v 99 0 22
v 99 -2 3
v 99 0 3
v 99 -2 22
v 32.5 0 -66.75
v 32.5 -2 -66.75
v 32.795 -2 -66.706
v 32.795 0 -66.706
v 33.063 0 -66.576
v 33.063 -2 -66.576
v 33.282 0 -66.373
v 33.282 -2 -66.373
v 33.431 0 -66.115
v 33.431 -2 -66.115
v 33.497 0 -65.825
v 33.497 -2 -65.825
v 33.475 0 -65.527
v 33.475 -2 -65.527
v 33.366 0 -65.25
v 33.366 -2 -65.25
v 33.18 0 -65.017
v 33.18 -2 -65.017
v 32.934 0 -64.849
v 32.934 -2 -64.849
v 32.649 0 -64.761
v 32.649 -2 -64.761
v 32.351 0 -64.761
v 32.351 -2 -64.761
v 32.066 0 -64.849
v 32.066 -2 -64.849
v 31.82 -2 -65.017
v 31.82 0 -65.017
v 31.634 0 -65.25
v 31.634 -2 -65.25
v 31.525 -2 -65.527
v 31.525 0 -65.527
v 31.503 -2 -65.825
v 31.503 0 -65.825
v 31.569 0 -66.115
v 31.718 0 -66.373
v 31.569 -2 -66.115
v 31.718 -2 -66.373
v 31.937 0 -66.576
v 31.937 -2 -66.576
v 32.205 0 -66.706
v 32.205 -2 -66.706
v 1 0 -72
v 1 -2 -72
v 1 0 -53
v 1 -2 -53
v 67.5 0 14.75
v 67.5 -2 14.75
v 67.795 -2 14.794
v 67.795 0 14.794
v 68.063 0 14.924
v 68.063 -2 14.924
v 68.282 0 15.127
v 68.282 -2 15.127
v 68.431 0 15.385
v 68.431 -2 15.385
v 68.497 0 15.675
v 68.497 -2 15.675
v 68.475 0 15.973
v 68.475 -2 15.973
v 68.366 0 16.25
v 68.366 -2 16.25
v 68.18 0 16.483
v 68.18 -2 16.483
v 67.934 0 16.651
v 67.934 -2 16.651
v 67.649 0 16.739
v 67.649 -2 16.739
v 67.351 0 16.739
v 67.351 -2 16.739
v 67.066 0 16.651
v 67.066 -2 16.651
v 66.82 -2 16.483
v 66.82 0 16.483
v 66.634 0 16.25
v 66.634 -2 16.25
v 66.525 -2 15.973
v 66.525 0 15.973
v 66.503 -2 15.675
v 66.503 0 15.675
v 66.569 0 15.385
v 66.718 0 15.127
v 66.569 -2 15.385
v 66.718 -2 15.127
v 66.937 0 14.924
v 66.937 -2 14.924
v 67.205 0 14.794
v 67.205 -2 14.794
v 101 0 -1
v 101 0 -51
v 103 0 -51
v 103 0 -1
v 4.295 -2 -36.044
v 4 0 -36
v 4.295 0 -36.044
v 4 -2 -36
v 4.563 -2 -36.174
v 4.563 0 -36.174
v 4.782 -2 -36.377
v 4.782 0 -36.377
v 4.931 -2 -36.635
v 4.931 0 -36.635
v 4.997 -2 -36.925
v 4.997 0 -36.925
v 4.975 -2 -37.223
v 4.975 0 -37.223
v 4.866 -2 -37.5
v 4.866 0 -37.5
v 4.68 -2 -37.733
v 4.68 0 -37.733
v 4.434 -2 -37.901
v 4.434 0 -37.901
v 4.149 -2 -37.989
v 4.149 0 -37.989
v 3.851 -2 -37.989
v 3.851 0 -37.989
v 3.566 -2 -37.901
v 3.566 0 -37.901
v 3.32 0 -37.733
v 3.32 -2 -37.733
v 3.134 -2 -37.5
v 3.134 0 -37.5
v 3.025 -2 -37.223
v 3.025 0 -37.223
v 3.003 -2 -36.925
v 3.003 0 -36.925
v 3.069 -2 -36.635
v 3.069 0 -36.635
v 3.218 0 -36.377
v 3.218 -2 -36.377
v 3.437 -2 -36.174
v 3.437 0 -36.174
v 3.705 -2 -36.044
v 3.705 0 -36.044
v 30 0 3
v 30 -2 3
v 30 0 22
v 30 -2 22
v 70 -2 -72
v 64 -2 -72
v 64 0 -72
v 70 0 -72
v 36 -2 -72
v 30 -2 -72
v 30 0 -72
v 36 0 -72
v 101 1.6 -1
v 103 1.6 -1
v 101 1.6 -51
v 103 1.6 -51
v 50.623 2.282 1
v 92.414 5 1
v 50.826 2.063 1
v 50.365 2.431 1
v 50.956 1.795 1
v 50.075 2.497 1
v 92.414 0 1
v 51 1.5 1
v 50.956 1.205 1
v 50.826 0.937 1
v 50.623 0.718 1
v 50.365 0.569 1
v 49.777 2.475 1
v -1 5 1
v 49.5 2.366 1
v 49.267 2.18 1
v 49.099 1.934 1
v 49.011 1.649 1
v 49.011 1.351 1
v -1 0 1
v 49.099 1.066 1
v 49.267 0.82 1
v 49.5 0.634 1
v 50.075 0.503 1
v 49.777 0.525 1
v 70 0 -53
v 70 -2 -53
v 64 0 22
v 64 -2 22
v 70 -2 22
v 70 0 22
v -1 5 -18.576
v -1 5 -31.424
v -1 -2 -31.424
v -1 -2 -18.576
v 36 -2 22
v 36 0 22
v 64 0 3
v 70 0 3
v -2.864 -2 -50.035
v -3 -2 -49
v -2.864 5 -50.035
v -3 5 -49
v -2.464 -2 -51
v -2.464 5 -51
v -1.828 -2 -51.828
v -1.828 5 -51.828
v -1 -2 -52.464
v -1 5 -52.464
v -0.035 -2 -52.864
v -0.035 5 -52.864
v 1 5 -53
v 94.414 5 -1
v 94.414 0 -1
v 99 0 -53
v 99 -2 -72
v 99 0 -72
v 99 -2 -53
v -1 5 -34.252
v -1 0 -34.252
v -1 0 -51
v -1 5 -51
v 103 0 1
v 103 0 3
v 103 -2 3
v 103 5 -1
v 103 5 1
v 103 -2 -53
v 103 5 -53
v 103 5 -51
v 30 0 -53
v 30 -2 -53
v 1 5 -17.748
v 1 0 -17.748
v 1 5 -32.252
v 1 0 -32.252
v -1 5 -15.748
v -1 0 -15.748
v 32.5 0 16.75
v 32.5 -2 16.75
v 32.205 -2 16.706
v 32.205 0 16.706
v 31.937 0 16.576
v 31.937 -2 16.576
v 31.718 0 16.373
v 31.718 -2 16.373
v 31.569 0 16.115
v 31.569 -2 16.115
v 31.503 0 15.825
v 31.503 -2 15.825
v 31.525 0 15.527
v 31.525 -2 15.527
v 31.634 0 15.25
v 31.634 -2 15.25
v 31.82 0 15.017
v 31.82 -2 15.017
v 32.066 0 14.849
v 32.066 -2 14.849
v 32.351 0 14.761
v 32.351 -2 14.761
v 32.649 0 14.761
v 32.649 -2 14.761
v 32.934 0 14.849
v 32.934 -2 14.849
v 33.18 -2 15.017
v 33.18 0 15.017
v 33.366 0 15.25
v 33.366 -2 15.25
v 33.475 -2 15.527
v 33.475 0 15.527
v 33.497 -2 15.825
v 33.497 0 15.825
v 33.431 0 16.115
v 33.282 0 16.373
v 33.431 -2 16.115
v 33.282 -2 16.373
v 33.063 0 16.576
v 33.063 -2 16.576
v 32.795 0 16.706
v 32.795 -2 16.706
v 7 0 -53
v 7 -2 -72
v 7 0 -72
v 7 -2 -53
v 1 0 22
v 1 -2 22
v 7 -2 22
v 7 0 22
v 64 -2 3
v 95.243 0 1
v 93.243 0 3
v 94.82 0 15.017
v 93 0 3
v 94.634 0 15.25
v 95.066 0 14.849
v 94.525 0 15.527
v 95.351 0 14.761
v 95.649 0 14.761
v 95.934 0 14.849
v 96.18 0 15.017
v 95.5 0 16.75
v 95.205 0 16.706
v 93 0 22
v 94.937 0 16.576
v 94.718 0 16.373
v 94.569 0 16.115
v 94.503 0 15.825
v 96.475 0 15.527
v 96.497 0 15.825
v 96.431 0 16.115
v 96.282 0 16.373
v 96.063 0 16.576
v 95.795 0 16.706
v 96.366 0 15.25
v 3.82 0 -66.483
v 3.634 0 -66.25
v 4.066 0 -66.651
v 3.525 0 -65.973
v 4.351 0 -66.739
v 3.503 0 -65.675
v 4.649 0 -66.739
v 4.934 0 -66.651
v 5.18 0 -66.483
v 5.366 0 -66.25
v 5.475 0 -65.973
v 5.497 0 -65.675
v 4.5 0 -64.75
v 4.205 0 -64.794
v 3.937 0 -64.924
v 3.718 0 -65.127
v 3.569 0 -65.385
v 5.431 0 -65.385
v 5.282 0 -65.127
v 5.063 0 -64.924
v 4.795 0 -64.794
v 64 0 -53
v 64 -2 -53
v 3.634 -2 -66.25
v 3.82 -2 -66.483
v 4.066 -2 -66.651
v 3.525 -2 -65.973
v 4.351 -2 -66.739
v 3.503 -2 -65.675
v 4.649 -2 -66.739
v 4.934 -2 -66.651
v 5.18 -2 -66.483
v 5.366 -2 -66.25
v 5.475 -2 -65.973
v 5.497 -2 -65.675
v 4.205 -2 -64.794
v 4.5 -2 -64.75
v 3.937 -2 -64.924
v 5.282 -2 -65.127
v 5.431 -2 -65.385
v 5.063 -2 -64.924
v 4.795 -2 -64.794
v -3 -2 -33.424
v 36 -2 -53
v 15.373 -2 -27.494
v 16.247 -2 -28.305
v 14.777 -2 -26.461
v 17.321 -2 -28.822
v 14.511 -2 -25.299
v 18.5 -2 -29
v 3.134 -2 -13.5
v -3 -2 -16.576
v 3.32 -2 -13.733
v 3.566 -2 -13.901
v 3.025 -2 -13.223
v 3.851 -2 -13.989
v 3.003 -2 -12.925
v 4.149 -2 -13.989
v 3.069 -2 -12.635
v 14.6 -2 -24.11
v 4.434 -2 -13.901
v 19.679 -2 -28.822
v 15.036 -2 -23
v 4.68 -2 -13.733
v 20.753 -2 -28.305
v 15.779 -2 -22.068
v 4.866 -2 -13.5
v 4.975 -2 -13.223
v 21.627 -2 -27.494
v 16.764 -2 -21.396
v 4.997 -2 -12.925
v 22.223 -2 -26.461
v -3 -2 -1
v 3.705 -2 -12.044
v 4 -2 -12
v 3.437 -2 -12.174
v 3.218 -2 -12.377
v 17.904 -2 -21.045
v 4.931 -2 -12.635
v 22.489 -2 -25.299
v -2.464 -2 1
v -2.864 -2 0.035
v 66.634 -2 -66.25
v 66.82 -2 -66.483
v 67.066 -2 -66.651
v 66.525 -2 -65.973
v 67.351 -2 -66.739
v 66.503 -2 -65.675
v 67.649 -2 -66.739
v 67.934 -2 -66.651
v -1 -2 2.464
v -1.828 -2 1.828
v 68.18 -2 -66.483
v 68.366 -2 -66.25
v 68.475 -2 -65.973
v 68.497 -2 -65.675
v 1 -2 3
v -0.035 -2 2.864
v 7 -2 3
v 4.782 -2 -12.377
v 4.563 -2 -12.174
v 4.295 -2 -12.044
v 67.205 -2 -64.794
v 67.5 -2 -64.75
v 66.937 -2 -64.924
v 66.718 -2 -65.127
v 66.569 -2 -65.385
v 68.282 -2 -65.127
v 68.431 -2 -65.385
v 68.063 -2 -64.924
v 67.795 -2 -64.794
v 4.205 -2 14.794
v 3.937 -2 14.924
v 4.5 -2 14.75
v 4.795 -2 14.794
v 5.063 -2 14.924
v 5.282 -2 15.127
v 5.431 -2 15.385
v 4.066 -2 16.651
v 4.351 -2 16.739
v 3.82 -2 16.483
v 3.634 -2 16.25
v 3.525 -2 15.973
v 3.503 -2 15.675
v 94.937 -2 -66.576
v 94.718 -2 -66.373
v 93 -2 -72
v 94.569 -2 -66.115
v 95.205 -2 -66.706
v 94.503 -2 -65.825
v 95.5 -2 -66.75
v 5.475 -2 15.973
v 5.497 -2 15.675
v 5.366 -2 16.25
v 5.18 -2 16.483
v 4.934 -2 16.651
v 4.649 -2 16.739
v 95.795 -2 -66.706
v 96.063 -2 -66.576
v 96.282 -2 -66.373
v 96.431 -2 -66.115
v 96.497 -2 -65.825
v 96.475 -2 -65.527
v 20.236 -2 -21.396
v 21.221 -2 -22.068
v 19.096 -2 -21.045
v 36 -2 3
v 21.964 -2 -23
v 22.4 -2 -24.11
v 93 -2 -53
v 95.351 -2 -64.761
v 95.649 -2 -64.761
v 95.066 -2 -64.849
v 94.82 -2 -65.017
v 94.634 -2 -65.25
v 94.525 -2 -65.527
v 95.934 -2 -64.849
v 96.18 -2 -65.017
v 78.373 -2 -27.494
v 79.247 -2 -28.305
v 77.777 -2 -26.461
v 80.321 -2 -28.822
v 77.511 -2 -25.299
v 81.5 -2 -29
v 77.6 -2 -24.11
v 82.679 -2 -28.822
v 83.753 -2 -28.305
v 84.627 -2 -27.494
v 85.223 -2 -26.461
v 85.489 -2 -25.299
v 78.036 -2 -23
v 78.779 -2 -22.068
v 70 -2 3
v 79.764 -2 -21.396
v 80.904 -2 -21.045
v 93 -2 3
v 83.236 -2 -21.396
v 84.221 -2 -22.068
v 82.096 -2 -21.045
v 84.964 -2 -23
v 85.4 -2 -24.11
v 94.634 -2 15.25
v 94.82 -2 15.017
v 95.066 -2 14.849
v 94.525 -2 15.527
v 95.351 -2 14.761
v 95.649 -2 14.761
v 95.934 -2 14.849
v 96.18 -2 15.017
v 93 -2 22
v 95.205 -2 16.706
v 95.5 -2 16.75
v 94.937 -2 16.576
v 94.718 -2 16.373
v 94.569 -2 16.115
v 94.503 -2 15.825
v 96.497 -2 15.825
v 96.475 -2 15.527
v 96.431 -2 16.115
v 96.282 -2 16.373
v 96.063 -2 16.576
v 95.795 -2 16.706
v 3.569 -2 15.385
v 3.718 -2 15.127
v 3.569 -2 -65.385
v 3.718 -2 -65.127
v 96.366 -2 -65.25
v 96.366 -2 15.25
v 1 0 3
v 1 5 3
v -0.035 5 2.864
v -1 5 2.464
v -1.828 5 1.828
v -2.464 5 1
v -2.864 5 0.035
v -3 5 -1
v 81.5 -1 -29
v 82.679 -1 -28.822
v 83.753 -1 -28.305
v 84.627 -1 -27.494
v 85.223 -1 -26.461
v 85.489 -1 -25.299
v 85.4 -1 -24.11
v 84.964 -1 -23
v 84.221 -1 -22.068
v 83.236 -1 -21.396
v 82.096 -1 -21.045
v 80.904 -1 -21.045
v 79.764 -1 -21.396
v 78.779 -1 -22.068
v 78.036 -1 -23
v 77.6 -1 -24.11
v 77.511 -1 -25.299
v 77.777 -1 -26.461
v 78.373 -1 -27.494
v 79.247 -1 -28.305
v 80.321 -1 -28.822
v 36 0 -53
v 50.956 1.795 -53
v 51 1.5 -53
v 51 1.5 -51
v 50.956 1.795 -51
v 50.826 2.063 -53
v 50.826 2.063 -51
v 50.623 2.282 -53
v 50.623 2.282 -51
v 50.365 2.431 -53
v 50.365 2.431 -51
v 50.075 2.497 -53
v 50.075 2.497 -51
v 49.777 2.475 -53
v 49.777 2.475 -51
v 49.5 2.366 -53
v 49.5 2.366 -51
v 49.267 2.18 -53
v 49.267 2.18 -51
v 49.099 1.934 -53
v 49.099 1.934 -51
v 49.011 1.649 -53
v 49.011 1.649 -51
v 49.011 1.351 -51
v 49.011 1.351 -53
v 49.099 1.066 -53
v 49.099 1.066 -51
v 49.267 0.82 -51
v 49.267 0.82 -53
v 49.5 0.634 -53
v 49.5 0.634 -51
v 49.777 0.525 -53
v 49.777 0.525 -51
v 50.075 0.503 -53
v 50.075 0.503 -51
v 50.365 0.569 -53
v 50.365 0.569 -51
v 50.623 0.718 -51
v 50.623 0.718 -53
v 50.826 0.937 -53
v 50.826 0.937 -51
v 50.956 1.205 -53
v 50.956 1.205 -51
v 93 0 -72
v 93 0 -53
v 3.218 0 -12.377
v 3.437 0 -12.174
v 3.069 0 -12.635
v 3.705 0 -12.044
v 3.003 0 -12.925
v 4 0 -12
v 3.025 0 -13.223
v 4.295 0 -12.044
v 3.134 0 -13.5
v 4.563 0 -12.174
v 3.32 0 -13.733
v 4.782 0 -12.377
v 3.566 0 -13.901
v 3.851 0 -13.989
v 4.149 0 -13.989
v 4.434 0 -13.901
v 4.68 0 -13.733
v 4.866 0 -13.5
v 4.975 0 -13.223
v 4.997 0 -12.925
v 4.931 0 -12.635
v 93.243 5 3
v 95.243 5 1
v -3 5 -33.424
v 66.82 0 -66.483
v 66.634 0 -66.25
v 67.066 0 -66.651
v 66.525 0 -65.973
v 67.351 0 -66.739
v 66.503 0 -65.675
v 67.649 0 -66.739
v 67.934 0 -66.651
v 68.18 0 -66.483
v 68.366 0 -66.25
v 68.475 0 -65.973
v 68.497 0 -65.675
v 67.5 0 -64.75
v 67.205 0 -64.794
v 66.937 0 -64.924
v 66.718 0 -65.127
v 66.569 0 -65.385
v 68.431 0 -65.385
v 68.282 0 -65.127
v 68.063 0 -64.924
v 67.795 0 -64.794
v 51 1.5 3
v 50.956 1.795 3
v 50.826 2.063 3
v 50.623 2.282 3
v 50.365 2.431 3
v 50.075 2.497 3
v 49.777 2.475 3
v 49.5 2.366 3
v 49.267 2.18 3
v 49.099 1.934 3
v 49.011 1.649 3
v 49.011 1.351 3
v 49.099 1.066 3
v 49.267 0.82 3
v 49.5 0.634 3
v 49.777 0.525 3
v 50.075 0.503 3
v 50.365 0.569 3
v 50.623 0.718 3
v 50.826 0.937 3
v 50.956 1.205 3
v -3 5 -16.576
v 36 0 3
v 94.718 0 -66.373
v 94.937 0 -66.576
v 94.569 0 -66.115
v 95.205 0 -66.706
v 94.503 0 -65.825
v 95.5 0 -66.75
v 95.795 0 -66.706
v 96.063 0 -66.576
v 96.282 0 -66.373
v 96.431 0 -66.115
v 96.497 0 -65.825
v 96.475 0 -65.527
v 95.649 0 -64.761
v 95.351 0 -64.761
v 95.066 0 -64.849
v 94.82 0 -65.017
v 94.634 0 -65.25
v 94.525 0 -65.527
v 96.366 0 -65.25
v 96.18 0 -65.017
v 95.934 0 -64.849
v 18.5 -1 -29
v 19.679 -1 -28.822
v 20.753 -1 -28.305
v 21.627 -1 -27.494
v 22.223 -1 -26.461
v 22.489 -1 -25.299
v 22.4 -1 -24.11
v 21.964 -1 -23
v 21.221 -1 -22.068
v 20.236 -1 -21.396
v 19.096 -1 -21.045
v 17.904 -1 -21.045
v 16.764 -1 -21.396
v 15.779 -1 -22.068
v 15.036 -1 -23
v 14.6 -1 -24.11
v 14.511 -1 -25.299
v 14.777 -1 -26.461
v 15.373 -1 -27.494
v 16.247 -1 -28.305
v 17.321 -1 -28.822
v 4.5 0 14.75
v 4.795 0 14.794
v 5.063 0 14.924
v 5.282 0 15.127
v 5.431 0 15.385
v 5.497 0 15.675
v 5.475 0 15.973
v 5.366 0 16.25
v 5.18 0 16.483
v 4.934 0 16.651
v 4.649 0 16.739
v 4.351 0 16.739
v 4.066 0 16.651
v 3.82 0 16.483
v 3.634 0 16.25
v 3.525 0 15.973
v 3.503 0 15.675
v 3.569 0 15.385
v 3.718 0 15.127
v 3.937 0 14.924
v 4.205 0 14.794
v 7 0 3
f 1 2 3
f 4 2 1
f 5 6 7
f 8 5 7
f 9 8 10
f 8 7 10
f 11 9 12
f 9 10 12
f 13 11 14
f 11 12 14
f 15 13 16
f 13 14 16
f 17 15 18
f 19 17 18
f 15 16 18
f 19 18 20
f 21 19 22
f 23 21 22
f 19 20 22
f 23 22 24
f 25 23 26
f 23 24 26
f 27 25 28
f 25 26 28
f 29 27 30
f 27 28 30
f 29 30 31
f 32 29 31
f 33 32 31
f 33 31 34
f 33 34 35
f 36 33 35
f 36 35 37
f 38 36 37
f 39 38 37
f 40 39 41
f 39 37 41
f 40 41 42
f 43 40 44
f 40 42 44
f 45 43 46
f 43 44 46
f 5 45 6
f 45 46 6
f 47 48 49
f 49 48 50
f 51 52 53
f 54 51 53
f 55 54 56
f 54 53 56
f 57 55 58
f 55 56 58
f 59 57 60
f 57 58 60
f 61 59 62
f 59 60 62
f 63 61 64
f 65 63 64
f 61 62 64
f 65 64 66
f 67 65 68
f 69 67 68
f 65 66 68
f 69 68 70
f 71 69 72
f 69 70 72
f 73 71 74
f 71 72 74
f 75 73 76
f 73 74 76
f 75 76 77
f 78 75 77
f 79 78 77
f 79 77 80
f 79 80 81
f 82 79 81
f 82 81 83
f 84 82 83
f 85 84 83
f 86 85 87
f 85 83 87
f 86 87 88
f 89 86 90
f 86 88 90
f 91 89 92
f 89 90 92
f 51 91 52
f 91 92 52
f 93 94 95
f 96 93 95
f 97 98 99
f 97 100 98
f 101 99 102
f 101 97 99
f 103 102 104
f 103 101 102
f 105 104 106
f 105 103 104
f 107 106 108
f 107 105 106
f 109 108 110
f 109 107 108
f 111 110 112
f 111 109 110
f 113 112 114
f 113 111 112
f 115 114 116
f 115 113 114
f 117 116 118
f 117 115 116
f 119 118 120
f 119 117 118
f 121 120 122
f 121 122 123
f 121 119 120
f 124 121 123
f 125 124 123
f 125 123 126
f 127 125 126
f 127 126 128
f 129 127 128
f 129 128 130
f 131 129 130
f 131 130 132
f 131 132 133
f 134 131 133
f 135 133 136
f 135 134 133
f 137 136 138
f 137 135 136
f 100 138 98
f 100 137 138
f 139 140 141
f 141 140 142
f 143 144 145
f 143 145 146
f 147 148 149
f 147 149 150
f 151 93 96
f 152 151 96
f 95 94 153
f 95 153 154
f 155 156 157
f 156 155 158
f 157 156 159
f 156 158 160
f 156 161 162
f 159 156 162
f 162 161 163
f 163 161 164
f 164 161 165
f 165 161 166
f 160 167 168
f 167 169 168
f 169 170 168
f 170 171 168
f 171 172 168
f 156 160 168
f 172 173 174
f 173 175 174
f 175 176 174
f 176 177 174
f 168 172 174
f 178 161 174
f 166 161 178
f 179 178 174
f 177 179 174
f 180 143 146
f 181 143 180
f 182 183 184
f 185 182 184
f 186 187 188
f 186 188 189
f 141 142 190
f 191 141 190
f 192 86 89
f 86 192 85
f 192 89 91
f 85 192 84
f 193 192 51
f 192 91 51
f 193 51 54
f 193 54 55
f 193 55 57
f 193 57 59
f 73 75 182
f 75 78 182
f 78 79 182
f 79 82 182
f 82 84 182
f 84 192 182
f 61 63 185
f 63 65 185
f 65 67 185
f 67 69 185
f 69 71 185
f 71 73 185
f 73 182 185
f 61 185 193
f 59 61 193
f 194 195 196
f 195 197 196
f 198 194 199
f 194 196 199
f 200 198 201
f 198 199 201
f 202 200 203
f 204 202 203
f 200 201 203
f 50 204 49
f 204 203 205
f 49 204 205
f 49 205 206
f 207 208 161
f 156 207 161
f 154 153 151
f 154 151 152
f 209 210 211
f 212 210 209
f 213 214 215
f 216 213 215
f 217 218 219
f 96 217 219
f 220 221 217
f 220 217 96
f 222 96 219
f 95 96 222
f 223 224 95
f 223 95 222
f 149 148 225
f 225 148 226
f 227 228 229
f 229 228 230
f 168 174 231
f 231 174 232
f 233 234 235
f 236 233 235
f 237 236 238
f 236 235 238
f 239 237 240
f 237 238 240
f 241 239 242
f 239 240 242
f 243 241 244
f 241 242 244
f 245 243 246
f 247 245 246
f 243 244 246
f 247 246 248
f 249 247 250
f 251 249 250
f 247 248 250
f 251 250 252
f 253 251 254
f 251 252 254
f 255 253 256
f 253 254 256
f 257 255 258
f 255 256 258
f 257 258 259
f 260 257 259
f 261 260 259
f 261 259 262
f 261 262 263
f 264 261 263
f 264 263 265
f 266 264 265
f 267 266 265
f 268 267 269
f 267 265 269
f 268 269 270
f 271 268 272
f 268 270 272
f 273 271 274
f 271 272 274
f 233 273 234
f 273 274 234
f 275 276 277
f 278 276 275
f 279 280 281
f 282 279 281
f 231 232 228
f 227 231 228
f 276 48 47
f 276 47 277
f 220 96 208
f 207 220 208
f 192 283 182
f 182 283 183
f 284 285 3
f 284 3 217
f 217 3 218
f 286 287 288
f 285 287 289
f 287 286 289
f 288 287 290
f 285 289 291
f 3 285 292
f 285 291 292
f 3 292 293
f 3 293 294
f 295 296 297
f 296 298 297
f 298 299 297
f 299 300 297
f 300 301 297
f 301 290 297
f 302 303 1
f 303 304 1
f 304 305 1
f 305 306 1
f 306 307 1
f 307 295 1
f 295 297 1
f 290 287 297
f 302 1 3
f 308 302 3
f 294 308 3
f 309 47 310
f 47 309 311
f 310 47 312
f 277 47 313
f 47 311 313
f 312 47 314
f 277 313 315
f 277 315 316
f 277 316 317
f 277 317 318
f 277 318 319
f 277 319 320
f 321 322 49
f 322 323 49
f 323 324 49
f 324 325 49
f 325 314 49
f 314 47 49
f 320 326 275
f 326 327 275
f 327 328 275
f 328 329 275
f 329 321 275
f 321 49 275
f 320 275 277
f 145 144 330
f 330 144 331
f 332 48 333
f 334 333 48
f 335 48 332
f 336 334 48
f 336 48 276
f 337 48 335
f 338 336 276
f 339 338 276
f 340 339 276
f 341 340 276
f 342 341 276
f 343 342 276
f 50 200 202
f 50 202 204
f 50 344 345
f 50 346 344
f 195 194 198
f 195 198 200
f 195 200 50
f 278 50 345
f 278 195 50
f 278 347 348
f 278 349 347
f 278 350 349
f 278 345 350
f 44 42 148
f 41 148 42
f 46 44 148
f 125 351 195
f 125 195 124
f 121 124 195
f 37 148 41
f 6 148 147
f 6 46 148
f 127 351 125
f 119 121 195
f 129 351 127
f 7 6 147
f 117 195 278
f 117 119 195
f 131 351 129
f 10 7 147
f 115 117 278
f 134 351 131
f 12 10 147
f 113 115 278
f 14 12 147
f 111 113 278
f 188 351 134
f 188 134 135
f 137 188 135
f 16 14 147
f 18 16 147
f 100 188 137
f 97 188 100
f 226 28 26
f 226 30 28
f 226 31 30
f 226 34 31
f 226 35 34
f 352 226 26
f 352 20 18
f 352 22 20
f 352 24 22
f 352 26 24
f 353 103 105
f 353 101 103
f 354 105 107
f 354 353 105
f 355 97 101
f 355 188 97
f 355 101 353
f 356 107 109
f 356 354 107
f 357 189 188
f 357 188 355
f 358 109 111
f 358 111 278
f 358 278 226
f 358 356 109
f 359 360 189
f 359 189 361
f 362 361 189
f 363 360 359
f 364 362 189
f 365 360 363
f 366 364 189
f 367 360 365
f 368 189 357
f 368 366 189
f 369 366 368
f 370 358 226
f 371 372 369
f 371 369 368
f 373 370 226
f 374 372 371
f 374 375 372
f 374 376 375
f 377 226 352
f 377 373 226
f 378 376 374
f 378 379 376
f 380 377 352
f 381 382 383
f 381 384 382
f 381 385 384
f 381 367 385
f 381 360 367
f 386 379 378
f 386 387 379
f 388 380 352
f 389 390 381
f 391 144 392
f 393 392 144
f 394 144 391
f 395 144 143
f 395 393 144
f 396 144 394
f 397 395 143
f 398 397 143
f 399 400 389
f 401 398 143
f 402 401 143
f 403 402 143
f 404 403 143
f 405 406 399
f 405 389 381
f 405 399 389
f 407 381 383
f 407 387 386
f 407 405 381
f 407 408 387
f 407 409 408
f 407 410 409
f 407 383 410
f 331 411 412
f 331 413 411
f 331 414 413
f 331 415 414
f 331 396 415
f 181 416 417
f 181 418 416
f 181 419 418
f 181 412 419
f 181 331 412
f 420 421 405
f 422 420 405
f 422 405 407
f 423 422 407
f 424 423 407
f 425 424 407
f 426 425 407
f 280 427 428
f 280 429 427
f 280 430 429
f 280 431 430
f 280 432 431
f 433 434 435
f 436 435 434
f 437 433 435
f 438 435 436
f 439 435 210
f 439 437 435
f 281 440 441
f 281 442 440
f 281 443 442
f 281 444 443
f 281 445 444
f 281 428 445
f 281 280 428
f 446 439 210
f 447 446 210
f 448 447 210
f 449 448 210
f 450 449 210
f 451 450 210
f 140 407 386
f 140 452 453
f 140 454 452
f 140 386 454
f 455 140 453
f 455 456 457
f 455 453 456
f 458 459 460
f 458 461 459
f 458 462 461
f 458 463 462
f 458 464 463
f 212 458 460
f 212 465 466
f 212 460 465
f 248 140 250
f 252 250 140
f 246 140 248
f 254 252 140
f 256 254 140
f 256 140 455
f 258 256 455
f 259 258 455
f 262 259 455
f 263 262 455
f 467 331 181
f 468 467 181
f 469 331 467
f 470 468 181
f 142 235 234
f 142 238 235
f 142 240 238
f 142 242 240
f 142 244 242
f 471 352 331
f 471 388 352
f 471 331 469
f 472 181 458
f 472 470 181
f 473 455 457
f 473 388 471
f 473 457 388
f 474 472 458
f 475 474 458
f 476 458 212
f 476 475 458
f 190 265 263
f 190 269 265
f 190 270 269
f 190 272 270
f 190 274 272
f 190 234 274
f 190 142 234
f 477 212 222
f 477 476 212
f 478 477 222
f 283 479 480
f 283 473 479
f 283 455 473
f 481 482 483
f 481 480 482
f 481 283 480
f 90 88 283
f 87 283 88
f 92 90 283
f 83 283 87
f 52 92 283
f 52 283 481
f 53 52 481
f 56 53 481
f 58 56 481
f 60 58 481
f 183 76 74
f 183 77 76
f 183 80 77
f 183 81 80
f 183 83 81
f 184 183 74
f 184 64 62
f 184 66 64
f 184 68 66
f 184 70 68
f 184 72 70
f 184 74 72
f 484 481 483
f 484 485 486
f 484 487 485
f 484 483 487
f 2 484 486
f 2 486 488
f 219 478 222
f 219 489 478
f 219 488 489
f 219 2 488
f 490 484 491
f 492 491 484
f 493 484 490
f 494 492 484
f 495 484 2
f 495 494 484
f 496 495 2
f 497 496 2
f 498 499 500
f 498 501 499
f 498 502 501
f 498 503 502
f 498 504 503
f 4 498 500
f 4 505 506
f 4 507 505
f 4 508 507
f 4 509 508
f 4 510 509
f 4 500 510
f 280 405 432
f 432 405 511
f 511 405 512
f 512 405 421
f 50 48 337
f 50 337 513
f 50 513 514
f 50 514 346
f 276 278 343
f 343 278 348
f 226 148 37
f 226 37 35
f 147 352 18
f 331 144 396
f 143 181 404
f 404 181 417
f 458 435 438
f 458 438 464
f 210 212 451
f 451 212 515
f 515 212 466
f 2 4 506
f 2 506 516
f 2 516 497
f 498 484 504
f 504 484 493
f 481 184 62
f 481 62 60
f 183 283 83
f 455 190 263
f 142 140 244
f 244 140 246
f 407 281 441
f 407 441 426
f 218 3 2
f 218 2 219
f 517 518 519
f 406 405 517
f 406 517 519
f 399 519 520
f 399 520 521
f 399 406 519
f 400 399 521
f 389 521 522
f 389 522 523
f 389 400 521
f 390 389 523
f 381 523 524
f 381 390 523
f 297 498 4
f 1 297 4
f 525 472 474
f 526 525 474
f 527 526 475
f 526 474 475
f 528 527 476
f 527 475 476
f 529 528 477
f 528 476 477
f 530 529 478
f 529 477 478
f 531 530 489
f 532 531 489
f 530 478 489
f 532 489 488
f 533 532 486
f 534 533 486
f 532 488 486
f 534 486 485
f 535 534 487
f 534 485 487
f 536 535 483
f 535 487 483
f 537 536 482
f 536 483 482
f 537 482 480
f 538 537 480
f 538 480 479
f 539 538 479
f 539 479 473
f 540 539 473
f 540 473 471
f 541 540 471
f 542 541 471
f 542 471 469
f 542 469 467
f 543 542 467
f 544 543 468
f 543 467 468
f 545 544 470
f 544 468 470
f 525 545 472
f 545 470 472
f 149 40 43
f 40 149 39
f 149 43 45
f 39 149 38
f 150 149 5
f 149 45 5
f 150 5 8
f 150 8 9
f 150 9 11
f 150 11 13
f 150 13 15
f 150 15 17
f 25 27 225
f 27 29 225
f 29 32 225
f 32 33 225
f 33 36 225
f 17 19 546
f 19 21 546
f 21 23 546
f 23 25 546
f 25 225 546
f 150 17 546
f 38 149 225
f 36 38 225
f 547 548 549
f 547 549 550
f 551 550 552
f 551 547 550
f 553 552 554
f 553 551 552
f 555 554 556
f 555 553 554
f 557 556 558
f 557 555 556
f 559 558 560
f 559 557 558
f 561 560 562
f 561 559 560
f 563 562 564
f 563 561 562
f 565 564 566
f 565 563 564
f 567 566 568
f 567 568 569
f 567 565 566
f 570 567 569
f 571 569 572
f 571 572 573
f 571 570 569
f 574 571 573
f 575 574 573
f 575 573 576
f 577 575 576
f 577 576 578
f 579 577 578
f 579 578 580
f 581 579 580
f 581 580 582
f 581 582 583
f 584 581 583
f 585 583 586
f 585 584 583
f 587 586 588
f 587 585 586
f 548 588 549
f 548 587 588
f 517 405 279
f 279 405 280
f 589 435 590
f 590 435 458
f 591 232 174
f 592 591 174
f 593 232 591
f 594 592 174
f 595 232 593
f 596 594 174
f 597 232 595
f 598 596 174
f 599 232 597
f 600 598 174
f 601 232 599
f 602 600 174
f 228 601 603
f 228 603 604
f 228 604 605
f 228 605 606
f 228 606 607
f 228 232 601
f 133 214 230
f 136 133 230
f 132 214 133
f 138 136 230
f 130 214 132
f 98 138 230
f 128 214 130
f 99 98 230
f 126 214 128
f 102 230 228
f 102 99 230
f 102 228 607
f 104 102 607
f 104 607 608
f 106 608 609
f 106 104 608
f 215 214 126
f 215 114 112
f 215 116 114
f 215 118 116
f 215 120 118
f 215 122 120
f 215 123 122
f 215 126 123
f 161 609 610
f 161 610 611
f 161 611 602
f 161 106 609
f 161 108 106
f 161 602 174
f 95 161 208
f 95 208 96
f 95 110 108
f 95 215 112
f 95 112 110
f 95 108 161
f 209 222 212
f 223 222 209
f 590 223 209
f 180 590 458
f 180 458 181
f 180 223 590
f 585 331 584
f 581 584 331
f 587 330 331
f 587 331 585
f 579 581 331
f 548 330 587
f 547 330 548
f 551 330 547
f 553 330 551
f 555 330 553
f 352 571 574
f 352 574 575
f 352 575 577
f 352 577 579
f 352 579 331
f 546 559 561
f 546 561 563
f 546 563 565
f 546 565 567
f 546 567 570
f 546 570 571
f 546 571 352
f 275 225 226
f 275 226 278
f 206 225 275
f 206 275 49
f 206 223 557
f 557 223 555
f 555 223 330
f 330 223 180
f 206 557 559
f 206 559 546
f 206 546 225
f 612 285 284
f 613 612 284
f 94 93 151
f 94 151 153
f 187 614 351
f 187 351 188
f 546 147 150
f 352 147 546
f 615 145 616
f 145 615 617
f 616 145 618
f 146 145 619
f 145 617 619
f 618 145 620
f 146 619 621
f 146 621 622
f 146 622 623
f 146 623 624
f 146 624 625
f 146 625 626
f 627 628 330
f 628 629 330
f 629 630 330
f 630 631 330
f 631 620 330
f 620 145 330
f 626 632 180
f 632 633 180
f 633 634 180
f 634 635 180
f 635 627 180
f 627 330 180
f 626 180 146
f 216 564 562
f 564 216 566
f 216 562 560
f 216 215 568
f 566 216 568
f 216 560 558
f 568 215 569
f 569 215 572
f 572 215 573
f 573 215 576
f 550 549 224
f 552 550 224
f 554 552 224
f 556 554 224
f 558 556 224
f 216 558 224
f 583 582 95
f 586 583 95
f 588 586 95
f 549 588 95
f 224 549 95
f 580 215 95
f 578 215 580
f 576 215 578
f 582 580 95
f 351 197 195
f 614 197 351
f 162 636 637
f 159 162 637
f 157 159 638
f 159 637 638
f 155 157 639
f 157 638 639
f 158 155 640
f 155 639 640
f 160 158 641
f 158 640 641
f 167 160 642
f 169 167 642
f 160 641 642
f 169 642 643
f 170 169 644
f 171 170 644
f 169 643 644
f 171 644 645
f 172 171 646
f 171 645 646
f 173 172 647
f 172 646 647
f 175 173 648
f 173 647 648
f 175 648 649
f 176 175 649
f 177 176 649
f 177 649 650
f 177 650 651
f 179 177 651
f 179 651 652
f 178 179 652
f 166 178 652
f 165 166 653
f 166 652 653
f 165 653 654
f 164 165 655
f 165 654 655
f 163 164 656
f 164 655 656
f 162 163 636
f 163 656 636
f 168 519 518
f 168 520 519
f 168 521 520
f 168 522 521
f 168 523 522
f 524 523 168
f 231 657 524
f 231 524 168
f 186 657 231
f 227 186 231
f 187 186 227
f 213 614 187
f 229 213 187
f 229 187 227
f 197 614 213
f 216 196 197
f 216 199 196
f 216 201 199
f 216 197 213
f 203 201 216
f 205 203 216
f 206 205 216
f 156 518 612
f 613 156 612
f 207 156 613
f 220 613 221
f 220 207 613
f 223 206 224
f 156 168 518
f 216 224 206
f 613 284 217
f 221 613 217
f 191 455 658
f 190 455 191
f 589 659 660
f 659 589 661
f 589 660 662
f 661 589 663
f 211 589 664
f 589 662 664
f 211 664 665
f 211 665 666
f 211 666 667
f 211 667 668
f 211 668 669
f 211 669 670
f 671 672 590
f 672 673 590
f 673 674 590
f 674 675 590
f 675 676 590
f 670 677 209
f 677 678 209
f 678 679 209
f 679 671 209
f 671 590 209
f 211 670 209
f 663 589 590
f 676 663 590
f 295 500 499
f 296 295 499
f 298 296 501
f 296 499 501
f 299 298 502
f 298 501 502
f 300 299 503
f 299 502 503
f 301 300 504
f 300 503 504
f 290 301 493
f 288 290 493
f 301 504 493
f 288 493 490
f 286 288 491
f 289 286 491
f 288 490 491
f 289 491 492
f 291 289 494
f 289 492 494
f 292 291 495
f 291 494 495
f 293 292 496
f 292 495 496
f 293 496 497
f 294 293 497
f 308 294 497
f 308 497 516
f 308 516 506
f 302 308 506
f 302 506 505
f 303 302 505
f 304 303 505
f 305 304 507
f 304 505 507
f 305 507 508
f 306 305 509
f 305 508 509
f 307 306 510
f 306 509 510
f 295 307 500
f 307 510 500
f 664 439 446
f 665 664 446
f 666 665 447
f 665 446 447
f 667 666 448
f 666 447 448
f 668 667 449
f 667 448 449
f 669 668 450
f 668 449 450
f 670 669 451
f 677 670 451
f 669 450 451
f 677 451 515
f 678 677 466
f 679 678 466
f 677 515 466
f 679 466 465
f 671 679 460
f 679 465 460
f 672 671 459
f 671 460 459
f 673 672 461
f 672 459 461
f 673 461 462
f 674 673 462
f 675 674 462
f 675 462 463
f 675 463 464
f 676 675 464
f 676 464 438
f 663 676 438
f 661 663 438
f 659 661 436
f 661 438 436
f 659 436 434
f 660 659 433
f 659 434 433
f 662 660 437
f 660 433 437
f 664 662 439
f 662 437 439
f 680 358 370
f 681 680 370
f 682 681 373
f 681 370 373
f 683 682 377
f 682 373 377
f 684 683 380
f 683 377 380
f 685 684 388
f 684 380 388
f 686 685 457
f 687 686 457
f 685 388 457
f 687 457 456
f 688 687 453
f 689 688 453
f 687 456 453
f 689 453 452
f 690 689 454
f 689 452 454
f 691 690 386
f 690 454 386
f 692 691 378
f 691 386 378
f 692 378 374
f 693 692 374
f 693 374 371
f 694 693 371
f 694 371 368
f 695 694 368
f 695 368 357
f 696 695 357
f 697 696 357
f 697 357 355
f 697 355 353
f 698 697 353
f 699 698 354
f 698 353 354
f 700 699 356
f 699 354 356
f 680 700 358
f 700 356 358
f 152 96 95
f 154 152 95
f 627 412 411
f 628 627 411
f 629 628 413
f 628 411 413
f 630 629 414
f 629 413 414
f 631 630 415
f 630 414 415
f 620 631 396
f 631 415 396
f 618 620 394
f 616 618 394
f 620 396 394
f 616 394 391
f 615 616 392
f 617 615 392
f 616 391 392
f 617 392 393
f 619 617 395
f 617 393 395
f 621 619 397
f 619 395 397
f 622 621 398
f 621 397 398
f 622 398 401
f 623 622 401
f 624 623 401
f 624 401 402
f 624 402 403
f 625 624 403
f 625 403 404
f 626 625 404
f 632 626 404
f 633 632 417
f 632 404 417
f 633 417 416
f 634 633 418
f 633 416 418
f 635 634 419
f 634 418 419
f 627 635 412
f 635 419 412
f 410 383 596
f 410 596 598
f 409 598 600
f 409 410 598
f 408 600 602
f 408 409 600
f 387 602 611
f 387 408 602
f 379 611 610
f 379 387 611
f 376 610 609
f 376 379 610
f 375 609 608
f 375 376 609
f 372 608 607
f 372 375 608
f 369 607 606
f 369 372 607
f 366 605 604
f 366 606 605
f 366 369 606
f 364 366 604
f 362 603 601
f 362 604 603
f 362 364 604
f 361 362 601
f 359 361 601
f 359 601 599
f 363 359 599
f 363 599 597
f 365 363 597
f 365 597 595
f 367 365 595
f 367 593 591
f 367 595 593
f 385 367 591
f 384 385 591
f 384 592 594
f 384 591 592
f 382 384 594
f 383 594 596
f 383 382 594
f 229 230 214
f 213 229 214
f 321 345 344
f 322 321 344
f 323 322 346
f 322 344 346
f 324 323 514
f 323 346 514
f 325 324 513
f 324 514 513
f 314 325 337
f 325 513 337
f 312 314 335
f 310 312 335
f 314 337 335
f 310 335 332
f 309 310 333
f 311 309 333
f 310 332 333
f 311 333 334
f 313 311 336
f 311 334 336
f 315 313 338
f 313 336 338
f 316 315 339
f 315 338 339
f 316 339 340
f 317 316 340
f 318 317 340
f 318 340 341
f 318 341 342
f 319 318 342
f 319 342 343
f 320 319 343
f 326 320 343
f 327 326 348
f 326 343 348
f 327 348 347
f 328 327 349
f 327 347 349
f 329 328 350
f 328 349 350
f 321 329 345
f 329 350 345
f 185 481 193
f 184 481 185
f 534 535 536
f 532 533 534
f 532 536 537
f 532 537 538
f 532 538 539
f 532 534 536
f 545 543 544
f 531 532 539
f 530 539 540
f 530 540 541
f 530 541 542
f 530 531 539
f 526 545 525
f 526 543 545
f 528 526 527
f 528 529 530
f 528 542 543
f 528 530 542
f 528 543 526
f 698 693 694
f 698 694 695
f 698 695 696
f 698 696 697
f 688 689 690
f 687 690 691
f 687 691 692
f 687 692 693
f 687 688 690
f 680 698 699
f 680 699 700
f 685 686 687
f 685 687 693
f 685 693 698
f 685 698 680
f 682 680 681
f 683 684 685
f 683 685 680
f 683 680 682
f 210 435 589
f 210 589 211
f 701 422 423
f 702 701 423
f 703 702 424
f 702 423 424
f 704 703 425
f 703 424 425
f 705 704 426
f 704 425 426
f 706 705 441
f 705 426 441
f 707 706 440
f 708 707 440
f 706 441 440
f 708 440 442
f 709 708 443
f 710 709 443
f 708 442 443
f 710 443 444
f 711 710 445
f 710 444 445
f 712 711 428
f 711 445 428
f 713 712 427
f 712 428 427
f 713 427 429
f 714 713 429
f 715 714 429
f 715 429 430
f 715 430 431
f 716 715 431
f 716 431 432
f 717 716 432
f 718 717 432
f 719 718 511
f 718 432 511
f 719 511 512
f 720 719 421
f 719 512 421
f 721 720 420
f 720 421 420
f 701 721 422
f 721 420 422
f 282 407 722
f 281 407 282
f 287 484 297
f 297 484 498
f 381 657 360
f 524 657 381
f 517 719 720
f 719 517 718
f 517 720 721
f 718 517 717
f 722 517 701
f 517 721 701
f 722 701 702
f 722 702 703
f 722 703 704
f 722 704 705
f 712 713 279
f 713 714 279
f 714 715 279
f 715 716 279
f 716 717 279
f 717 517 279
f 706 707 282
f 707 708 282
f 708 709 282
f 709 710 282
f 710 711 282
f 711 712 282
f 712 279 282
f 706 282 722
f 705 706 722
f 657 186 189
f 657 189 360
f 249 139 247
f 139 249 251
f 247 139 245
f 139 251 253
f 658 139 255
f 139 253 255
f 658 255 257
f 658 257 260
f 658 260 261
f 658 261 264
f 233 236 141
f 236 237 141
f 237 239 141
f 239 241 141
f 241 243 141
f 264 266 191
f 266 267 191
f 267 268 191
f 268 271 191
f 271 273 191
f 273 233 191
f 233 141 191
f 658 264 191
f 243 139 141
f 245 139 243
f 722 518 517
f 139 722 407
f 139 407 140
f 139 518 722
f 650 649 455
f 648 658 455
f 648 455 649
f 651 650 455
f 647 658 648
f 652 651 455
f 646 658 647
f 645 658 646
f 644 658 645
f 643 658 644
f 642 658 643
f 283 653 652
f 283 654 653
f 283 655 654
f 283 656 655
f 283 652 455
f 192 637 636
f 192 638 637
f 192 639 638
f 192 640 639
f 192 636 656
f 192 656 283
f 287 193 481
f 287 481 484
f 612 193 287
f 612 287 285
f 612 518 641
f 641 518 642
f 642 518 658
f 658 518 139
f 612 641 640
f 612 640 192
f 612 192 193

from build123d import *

# Parameters (mm, degrees)
SALIENTE_EXTRUIR1_DEPTH    = 5
CROQUIS1_3_W               = 2
CROQUIS1_3_H               = 50
SALIENTE_EXTRUIR2_DEPTH    = 1.6
CROQUIS1_4_R               = 1
SALIENTE_EXTRUIR3_DEPTH    = 3
SALIENTE_EXTRUIR3_2_DEPTH  = 3
SALIENTE_EXTRUIR5_DEPTH    = 2
CROQUIS2_W                 = 6
CROQUIS2_H                 = 19
CROQUIS2_R                 = 1
SALIENTE_EXTRUIR6_DEPTH    = 2
CROQUIS3_R                 = 1
CORTAR_EXTRUIR2_DEPTH      = 2
CORTAR_EXTRUIR3_START      = -56
CROQUIS3_2_R               = 1
CORTAR_EXTRUIR3_DEPTH      = 2
REDONDEO1_R                = 4
CROQUIS4_R                 = 4
CORTAR_EXTRUIR4_DEPTH      = 1
CORTAR_EXTRUIR5_DEPTH      = 126.769630674
CORTAR_EXTRUIR5_DEPTH_BACK = 126.769630674
CROQUIS1_7_R               = 1


with BuildPart() as part:
    # Croquis1 → Saliente-Extruir1 (new body)
    with BuildSketch(Plane(origin=(0, 0, 0), x_dir=(1, 0, 0), z_dir=(0, 1, 0))):
        Polygon((103, 51), (103, 53), (-3, 53), (-3, 33.42402598), (-1, 31.42402598), (-1, 18.57597402), (-3, 16.57597402), (-3, -3), (93.242640687, -3), (95.242640687, -1), (103, -1), (103, 1), (101, 1), (94.414213562, 1), (92.414213562, -1), (-1, -1), (-1, 15.747546896), (1, 17.747546896), (1, 32.252453104), (-1, 34.252453104), (-1, 51), (101, 51), align=None)
    extrude(amount=SALIENTE_EXTRUIR1_DEPTH)



with BuildPart() as body_2:
    # Croquis1<3> → Saliente-Extruir2 (new body)
    with BuildSketch(Plane(origin=(0, 0, 0), x_dir=(1, 0, 0), z_dir=(0, 1, 0))):
        with Locations((102, 26)):
            Rectangle(CROQUIS1_3_W, CROQUIS1_3_H)
    extrude(amount=SALIENTE_EXTRUIR2_DEPTH)


with BuildPart() as body_3:
    # Croquis1<4> → Saliente-Extruir3 (new body)
    with BuildSketch(Plane(origin=(0, 0, 0), x_dir=(1, 0, 0), z_dir=(0, 1, 0))):
        with Locations(Location((4, 13, 0), (0, 0, 270))):
            Circle(CROQUIS1_4_R)
    extrude(amount=SALIENTE_EXTRUIR3_DEPTH)


with BuildPart() as body_4:
    # Croquis1<4> → Saliente-Extruir3 2 (new body)
    with BuildSketch(Plane(origin=(0, 0, 0), x_dir=(1, 0, 0), z_dir=(0, 1, 0))):
        with Locations(Location((4, 37, 0), (0, 0, 270))):
            Circle(CROQUIS1_4_R)
    extrude(amount=SALIENTE_EXTRUIR3_2_DEPTH)


with BuildPart() as part_1:
    add(part.part)

    add(body_4.part)  # Saliente-Extruir5 merges body 4
    # Croquis1<6> → Saliente-Extruir5 (add)
    with BuildSketch(Plane(origin=(0, 0, 0), x_dir=(1, 0, 0), z_dir=(0, 1, 0))):
        Polygon((103, 53), (-3, 53), (-3, 33.42402598), (-1, 31.42402598), (-1, 18.57597402), (-3, 16.57597402), (-3, -3), (103, -3), align=None)
    extrude(amount=-SALIENTE_EXTRUIR5_DEPTH)

    # Croquis2 → Saliente-Extruir6 (add)
    # profile 1 of 8: a face of its own
    with BuildSketch(Plane.XZ.offset(2)):
        with Locations((96, -62.5)):
            Rectangle(CROQUIS2_W, CROQUIS2_H)
        with Locations(Location((95.5, -65.75, 0), (0, 0, 270))):
            Circle(CROQUIS2_R, mode=Mode.SUBTRACT)
    # profile 2 of 8: a face of its own
    with BuildSketch(Plane.XZ.offset(2)):
        with Locations((67, -62.5)):
            Rectangle(CROQUIS2_W, CROQUIS2_H)
        with Locations(Location((67.5, -65.75, 0), (0, 0, 90))):
            Circle(CROQUIS2_R, mode=Mode.SUBTRACT)
    # profile 3 of 8: a face of its own
    with BuildSketch(Plane.XZ.offset(2)):
        with Locations((33, -62.5)):
            Rectangle(CROQUIS2_W, CROQUIS2_H)
        with Locations(Location((32.5, -65.75, 0), (0, 0, 270))):
            Circle(CROQUIS2_R, mode=Mode.SUBTRACT)
    # profile 4 of 8: a face of its own
    with BuildSketch(Plane.XZ.offset(2)):
        with Locations((4, -62.5)):
            Rectangle(CROQUIS2_W, CROQUIS2_H)
        with Locations(Location((4.5, -65.75, 0), (0, 0, 90))):
            Circle(CROQUIS2_R, mode=Mode.SUBTRACT)
    # profile 5 of 8: a face of its own
    with BuildSketch(Plane.XZ.offset(2)):
        with Locations((4, 12.5)):
            Rectangle(CROQUIS2_W, CROQUIS2_H)
        with Locations(Location((4.5, 15.75, 0), (0, 0, 270))):
            Circle(CROQUIS2_R, mode=Mode.SUBTRACT)
    # profile 6 of 8: a face of its own
    with BuildSketch(Plane.XZ.offset(2)):
        with Locations((33, 12.5)):
            Rectangle(CROQUIS2_W, CROQUIS2_H)
        with Locations(Location((32.5, 15.75, 0), (0, 0, 90))):
            Circle(CROQUIS2_R, mode=Mode.SUBTRACT)
    # profile 7 of 8: a face of its own
    with BuildSketch(Plane.XZ.offset(2)):
        with Locations((67, 12.5)):
            Rectangle(CROQUIS2_W, CROQUIS2_H)
        with Locations(Location((67.5, 15.75, 0), (0, 0, 270))):
            Circle(CROQUIS2_R, mode=Mode.SUBTRACT)
    # profile 8 of 8: a face of its own
    with BuildSketch(Plane.XZ.offset(2)):
        with Locations((96, 12.5)):
            Rectangle(CROQUIS2_W, CROQUIS2_H)
        with Locations(Location((95.5, 15.75, 0), (0, 0, 90))):
            Circle(CROQUIS2_R, mode=Mode.SUBTRACT)
    extrude(amount=-SALIENTE_EXTRUIR6_DEPTH)

    # Croquis3 → Cortar-Extruir2 (cut)
    with BuildSketch(Plane.XY.offset(3)):
        with Locations((50, 1.5)):
            Circle(CROQUIS3_R)
    extrude(amount=-CORTAR_EXTRUIR2_DEPTH, mode=Mode.SUBTRACT)

    # Croquis3<2> → Cortar-Extruir3 (cut)
    with BuildSketch(Plane.XY.offset(3).offset(CORTAR_EXTRUIR3_START)):
        with Locations((50, 1.5)):
            Circle(CROQUIS3_2_R)
    extrude(amount=CORTAR_EXTRUIR3_DEPTH, mode=Mode.SUBTRACT)

    # Redondeo1
    redondeo1_edges = [part_1.edges().sort_by_distance(p)[0] for p in [
        (-3, 1.5, 3),
        (-3, 1.5, -53),
    ]]
    fillet(redondeo1_edges, radius=REDONDEO1_R)

    # Croquis4 → Cortar-Extruir4 (cut)
    with BuildSketch(Plane.XZ.offset(2)):
        with Locations(Location((18.5, -25, 0), (0, 0, 270))):
            Circle(CROQUIS4_R)
        with Locations(Location((81.5, -25, 0), (0, 0, 270))):
            Circle(CROQUIS4_R)
    extrude(amount=-CORTAR_EXTRUIR4_DEPTH, mode=Mode.SUBTRACT)


with BuildPart() as cortar_extruir5_tool:
    # Croquis1<7> → Cortar-Extruir5 (new, two sides: drawn at the far end of the back side and taken through both)
    with BuildSketch(Plane(origin=(0, 0, 0), x_dir=(1, 0, 0), z_dir=(0, 1, 0)).offset(-CORTAR_EXTRUIR5_DEPTH_BACK)):
        with Locations(Location((4, 13, 0), (0, 0, 270))):
            Circle(CROQUIS1_7_R)
        with Locations(Location((4, 37, 0), (0, 0, 270))):
            Circle(CROQUIS1_7_R)
    extrude(amount=CORTAR_EXTRUIR5_DEPTH + CORTAR_EXTRUIR5_DEPTH_BACK)


with BuildPart() as part_2:
    add(part_1.part)

    # Cortar-Extruir5: cut by cortar_extruir5_tool
    add(cortar_extruir5_tool.part, mode=Mode.SUBTRACT)


with BuildPart() as body_3_1:
    add(body_3.part)

    # Cortar-Extruir5: cut by cortar_extruir5_tool
    add(cortar_extruir5_tool.part, mode=Mode.SUBTRACT)


solid = Compound([body_2.part, part_2.part])
